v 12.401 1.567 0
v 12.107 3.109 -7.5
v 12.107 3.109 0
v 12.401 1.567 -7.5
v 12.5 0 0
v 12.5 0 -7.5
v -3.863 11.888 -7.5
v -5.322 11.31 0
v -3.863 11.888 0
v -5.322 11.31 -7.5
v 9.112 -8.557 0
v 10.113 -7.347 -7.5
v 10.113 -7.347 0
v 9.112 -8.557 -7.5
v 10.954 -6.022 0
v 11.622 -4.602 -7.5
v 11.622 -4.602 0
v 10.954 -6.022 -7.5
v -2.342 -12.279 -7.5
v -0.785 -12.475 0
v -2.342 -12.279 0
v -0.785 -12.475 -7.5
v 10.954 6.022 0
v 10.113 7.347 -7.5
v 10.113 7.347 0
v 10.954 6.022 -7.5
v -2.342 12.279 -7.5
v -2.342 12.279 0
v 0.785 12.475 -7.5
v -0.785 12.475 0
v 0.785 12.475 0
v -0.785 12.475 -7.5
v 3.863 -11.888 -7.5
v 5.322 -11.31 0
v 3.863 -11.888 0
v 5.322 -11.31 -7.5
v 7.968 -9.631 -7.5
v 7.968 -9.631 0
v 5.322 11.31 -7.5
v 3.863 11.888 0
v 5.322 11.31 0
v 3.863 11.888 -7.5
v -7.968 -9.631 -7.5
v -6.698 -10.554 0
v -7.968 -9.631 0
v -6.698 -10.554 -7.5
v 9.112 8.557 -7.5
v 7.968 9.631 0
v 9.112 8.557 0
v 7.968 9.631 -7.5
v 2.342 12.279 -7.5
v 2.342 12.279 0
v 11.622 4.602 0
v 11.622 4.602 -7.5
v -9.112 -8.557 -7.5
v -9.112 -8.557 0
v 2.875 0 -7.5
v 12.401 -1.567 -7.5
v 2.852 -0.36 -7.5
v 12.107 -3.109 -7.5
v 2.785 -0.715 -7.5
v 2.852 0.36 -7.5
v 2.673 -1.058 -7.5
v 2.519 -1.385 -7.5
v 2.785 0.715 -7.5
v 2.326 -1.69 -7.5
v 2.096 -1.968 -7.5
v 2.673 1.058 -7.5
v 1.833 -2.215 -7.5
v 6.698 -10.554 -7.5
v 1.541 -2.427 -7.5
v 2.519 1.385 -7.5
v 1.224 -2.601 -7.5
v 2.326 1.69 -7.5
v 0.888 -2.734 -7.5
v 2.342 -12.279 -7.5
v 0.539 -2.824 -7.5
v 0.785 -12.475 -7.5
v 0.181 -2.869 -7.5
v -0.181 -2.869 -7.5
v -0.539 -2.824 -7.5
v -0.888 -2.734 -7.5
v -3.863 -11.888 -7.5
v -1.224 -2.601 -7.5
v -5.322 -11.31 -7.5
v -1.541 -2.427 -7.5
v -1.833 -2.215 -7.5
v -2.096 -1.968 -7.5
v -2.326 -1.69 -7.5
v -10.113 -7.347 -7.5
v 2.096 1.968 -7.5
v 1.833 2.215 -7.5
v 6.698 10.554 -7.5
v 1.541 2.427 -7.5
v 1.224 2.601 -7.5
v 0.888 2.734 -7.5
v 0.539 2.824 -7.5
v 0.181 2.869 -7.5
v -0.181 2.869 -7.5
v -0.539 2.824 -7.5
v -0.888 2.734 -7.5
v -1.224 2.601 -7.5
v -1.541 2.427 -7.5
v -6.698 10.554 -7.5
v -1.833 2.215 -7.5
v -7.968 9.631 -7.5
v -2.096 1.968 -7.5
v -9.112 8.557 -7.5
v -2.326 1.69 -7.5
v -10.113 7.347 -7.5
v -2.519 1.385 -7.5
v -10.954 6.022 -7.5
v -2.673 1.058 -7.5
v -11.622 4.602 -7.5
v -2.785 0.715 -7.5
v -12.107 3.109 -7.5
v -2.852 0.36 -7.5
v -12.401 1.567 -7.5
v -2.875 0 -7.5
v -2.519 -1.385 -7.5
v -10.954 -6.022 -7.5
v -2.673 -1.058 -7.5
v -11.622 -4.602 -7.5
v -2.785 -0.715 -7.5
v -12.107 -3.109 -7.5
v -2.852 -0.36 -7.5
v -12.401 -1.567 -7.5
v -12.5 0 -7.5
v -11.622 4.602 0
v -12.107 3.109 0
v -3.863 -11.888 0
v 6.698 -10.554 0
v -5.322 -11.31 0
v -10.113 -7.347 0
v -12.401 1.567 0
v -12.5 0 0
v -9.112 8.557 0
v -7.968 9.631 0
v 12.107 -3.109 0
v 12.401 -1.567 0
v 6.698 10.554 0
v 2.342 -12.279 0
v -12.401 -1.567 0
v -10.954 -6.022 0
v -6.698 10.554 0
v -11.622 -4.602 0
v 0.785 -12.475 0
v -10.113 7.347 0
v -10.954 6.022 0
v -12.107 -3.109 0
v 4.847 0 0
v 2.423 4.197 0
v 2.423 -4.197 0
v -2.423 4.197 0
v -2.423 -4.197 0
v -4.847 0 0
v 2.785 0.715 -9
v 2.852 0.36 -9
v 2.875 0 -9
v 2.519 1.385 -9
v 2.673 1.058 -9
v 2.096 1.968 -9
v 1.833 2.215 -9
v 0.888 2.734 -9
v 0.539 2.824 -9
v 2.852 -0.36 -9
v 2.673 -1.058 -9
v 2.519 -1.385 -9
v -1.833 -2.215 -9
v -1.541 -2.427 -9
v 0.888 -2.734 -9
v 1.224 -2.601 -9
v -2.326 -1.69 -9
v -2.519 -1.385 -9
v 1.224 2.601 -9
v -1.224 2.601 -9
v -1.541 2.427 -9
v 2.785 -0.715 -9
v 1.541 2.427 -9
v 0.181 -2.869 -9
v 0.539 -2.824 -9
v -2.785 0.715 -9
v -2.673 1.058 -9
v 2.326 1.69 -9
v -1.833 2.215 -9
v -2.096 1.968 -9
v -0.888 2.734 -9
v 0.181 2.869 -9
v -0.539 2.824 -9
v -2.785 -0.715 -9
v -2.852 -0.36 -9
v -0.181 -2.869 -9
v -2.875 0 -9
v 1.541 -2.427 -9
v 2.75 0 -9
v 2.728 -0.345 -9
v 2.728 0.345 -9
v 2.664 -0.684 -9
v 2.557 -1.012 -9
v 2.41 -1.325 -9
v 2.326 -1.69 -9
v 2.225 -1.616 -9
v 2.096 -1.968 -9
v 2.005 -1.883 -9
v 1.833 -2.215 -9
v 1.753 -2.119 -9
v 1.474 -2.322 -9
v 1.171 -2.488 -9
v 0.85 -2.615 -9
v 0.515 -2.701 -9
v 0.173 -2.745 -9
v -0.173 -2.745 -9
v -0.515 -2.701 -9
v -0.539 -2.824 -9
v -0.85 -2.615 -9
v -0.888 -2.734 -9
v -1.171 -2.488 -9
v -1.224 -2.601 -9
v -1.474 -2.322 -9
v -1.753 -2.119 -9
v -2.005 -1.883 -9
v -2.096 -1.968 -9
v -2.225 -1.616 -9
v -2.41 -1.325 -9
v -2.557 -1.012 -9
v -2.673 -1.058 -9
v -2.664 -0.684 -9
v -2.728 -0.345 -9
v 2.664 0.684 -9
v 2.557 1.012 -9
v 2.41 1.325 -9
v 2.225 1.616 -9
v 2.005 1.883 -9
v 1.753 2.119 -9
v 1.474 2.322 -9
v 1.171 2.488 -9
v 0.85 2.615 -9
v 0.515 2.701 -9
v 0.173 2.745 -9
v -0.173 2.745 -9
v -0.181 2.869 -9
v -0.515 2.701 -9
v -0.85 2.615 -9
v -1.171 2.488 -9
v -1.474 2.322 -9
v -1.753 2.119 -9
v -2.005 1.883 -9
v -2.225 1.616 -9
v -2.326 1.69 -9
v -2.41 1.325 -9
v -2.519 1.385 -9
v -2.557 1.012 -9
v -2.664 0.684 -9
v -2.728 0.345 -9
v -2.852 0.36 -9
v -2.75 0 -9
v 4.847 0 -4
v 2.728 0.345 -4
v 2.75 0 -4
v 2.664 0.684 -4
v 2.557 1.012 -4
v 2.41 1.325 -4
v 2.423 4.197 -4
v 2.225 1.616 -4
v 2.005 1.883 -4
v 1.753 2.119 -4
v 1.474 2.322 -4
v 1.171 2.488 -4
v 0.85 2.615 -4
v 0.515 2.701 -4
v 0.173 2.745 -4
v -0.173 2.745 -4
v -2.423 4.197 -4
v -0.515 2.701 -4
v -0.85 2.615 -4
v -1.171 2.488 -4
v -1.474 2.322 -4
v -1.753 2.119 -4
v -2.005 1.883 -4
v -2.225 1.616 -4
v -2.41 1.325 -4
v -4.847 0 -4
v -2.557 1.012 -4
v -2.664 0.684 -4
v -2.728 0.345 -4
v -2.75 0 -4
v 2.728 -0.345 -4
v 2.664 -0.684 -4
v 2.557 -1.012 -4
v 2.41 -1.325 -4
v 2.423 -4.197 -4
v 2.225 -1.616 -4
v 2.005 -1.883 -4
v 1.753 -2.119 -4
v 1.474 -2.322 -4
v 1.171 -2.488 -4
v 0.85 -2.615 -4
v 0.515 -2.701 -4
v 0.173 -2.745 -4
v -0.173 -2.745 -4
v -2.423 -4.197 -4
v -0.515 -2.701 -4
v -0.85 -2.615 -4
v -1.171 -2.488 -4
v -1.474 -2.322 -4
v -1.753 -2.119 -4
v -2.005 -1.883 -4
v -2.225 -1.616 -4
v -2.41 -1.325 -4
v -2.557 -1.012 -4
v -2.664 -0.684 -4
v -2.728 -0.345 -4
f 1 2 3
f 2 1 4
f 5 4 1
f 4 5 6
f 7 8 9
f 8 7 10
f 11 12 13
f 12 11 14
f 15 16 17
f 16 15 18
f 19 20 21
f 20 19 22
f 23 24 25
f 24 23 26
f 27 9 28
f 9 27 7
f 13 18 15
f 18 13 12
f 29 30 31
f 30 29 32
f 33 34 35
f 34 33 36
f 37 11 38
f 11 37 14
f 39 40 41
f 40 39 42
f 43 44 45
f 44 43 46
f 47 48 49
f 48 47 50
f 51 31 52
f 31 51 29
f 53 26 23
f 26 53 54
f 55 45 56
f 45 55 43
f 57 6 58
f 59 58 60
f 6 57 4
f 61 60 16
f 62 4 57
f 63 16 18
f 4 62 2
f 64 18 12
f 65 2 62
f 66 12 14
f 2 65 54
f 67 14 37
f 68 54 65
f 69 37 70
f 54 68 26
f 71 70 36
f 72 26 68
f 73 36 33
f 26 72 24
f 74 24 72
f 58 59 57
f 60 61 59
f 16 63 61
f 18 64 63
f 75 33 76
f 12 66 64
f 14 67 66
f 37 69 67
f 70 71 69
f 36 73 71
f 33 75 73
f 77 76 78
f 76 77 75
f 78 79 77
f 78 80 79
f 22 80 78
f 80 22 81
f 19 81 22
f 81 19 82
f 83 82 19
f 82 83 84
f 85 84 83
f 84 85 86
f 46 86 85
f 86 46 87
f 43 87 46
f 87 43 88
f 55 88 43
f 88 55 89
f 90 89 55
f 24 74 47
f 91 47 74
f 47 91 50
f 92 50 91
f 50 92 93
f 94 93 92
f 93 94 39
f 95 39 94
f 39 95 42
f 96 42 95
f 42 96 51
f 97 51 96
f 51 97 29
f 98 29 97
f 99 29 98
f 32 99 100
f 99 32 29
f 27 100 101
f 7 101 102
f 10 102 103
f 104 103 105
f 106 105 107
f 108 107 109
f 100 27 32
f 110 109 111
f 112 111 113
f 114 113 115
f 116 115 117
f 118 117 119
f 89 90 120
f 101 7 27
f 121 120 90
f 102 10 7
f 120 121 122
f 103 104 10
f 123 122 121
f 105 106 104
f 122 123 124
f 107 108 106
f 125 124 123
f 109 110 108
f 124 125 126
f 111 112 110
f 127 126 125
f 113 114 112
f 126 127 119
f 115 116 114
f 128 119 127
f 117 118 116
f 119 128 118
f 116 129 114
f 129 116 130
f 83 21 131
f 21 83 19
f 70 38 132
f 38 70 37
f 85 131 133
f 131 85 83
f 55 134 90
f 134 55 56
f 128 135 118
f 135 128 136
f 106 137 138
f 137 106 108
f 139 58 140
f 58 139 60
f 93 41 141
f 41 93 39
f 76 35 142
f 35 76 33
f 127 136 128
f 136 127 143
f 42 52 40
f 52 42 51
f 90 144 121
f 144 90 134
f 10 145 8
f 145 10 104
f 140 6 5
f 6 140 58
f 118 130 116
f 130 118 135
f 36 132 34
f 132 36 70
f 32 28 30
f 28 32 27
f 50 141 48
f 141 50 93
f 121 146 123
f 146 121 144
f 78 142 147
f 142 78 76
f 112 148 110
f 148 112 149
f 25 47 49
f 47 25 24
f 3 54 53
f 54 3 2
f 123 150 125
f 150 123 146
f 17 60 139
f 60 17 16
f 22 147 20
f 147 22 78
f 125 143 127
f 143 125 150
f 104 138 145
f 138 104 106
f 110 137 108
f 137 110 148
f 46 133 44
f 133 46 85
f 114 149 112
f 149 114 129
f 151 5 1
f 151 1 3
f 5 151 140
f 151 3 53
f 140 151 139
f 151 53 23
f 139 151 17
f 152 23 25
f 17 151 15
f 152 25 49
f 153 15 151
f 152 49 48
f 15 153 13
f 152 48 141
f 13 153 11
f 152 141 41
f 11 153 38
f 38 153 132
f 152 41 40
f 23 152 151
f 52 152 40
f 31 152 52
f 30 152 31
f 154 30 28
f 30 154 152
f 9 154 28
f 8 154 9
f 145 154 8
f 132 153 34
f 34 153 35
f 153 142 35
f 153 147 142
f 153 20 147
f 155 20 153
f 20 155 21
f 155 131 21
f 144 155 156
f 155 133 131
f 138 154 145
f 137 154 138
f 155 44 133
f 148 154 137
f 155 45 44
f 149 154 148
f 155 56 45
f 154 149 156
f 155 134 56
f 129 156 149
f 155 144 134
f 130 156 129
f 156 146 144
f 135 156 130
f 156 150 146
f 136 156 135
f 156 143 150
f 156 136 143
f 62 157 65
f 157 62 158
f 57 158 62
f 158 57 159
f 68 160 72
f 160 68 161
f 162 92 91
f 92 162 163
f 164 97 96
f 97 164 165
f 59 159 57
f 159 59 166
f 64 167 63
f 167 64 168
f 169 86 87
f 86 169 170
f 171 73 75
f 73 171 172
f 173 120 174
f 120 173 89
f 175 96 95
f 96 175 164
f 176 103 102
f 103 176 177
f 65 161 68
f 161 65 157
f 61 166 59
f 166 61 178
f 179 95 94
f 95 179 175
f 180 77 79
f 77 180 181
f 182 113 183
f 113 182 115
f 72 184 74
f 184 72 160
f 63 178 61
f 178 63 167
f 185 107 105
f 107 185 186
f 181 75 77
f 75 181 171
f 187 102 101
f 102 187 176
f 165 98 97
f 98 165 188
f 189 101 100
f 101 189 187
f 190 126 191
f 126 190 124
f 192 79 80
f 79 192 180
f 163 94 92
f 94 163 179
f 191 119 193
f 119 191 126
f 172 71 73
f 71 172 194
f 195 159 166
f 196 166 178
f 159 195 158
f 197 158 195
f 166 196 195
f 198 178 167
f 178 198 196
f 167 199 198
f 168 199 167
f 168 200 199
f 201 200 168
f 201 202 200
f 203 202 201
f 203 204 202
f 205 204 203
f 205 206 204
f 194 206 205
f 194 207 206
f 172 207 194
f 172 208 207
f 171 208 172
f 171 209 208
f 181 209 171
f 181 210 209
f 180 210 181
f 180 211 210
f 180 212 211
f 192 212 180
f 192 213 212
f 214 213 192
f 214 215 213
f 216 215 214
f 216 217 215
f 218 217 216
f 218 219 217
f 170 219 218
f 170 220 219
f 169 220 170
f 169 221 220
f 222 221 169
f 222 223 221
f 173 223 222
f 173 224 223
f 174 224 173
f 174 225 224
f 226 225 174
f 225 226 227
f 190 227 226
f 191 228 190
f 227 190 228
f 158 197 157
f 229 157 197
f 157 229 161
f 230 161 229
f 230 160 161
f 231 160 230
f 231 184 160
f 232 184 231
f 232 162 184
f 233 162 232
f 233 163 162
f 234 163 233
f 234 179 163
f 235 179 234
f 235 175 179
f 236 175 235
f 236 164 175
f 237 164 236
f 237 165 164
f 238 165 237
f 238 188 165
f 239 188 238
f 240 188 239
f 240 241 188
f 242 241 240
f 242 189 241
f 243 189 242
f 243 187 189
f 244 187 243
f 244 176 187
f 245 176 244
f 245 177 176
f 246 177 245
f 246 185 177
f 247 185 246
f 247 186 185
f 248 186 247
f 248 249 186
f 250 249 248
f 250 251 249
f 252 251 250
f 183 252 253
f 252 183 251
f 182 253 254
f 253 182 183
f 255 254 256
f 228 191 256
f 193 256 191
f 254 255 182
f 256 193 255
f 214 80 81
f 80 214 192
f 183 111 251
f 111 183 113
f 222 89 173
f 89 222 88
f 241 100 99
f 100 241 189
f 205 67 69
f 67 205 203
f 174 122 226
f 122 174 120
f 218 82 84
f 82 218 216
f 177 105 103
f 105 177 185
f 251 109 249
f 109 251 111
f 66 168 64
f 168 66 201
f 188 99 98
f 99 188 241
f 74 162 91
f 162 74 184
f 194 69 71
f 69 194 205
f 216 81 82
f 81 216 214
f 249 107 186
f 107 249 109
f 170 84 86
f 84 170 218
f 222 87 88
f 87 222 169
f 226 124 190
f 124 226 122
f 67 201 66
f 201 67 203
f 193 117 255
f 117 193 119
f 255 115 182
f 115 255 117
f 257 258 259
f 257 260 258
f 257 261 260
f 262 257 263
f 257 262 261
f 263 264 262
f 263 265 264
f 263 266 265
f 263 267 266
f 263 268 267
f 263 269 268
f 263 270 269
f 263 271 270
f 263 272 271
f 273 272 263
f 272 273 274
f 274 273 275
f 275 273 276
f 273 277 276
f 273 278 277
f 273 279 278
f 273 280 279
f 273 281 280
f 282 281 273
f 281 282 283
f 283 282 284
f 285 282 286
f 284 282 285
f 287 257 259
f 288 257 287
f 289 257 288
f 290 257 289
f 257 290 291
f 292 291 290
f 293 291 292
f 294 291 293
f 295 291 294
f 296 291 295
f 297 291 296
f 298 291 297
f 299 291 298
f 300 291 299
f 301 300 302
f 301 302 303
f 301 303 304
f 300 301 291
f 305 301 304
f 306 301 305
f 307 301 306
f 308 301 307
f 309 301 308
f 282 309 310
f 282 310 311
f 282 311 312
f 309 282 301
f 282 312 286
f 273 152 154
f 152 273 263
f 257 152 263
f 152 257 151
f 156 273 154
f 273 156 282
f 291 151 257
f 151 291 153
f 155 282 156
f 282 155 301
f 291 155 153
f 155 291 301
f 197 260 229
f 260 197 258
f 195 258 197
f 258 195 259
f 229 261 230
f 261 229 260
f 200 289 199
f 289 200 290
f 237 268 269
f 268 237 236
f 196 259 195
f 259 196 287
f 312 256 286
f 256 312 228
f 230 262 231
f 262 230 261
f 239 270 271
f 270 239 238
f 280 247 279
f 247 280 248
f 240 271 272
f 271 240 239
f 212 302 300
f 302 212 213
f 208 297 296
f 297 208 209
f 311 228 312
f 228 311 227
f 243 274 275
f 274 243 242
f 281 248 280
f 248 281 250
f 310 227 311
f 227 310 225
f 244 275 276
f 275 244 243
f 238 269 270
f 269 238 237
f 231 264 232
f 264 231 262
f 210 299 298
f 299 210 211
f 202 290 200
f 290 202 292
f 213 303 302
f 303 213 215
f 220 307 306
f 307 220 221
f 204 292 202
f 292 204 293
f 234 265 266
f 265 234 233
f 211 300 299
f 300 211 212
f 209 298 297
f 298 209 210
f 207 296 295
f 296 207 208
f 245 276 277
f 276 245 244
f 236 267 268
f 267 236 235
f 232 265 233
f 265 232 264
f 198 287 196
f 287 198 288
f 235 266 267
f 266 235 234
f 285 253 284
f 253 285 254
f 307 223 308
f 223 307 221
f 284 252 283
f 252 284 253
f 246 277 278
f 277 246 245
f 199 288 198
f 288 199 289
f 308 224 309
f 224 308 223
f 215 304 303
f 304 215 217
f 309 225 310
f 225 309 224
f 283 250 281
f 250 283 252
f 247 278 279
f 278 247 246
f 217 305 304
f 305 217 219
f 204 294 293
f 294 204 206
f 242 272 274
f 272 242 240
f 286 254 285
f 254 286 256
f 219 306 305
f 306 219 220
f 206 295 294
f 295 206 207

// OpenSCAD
$fn = 50;

difference() {
	union() {
		translate(v = [0, 0, -7.5]) {
			cylinder(h = 7.5, r = 12.5);
		}
		#translate(v = [0, 0, -9.0]) {
			cylinder(h = 9, r = 2.875);
		}
	}
	union() {
		translate(v = [0, 0, 0]) {
			rotate(a = [0, 0, 0]) {
				difference() {
					union() {
						translate(v = [0, 0, -4]) {
							linear_extrude(height = 4) {
								polygon(points = [[4.8468, 0.0], [2.4234000000000004, 4.197451927062417], [-2.423399999999999, 4.197451927062417], [-4.8468, 5.935618106107392e-16], [-2.423400000000002, -4.197451927062416], [2.423399999999997, -4.197451927062419]]);
							}
						}
					}
					union();
				}
			}
		}
		#translate(v = [0, 0, -100.0]) {
			cylinder(h = 200, r = 2.75);
		}
	}
}
